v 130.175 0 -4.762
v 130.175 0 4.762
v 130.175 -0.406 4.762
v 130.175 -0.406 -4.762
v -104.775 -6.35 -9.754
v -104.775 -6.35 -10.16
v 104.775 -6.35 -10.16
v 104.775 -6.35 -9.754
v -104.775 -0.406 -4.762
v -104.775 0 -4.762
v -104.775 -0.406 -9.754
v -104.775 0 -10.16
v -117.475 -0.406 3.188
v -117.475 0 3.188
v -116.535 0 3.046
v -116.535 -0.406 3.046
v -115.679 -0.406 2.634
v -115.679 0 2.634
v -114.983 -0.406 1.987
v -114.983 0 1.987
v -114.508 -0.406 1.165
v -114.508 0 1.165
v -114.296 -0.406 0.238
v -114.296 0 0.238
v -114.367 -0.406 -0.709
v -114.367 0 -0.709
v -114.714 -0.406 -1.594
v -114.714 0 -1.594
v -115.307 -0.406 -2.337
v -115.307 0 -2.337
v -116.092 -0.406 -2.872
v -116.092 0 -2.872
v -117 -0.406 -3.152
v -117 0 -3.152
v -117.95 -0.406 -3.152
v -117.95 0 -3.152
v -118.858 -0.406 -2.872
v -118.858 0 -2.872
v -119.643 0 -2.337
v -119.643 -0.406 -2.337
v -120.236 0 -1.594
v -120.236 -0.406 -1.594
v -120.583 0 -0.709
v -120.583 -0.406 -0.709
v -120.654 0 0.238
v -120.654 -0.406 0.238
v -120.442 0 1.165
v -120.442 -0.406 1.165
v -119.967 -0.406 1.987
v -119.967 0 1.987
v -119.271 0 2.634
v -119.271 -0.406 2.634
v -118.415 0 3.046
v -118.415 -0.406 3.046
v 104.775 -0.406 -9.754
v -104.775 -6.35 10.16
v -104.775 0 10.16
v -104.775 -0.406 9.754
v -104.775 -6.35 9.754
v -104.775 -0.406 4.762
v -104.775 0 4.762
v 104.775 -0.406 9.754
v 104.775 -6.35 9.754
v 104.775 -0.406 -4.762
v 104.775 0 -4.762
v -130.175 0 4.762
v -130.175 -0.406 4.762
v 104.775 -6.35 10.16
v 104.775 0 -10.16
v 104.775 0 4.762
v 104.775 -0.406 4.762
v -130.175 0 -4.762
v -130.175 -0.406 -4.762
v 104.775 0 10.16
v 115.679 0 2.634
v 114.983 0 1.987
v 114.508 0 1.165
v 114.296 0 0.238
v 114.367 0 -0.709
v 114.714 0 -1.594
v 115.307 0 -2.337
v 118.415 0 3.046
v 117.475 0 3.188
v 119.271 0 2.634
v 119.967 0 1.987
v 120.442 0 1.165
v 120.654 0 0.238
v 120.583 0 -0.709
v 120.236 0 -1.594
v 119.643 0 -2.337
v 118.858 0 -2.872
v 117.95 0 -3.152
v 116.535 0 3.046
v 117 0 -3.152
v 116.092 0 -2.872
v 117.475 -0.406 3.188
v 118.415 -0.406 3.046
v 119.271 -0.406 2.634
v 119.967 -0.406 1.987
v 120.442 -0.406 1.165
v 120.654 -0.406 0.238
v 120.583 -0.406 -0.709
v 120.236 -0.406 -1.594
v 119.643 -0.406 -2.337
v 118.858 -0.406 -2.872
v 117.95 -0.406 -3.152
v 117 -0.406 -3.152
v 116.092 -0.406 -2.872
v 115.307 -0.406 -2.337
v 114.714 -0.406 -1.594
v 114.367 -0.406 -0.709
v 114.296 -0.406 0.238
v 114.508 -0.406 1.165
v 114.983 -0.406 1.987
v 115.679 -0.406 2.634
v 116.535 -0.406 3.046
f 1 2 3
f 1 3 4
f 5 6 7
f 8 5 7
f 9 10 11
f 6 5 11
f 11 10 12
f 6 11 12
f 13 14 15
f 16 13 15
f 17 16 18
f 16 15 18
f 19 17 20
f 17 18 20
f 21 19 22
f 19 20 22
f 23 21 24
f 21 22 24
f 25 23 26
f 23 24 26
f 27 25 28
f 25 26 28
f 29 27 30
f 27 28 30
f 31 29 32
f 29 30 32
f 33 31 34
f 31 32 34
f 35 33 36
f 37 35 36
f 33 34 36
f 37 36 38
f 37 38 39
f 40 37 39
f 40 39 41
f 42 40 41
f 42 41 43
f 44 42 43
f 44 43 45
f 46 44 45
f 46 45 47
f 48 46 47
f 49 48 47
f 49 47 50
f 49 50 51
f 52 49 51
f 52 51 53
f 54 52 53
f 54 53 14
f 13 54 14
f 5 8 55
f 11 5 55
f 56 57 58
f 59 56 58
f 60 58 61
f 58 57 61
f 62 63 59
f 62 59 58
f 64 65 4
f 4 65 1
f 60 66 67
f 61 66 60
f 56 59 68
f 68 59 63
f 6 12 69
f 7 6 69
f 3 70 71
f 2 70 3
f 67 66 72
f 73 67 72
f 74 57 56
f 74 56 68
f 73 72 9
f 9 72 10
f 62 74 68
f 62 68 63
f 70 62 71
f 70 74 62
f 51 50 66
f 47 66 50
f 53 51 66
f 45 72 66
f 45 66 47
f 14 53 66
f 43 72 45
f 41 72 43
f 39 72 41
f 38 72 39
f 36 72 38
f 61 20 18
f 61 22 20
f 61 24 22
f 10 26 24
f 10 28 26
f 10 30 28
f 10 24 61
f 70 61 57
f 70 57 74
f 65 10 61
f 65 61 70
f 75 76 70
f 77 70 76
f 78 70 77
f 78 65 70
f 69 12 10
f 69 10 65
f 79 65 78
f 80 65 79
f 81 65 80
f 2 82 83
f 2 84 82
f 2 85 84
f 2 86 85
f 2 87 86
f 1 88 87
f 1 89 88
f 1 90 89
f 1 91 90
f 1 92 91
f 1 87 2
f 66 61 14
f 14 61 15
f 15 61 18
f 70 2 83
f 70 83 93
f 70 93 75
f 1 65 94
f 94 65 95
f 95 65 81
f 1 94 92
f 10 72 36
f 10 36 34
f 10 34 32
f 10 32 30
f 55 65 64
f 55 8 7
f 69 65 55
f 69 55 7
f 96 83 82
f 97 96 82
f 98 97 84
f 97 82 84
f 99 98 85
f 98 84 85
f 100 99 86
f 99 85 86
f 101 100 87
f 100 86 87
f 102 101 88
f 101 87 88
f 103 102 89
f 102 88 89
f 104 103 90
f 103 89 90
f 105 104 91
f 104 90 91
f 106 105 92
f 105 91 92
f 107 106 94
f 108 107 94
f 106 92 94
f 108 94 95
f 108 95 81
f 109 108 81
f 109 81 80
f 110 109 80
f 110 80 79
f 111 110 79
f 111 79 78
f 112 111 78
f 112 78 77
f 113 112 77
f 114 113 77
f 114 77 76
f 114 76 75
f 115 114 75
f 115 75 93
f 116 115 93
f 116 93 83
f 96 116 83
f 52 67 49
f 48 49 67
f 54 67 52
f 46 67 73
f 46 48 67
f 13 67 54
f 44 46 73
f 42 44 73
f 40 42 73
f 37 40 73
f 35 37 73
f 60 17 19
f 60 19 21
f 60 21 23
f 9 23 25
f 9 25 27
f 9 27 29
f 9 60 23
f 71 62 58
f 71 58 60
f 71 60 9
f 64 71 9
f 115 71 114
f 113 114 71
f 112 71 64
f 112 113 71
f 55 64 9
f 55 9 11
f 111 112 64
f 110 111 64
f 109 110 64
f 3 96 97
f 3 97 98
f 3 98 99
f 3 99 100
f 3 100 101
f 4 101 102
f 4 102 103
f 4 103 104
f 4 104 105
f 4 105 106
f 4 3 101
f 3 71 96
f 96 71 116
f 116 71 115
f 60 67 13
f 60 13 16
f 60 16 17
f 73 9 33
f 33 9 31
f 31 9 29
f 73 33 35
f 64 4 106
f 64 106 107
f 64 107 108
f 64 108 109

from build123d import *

# Parameters (mm, degrees)
SKETCH2_W           = 260.35
SKETCH2_H           = 20.32
SKETCH2_R           = 3.1877
BOSS_EXTRUDE1_DEPTH = 6.35
SKETCH3_W           = 19.5072
SKETCH3_H           = 5.9436
CUT_EXTRUDE1_DEPTH  = 261.625537122
SKETCH4_W           = 25.4
SKETCH4_H           = 5.3975
CUT_EXTRUDE2_DEPTH  = 131.725203098


with BuildPart() as part:
    # Sketch2 → Boss-Extrude1 (new body)
    with BuildSketch(Plane(origin=(0, 0, 0), x_dir=(1, 0, 0), z_dir=(0, 1, 0))):
        Rectangle(SKETCH2_W, SKETCH2_H)
        with Locations(Location((-117.475, 0, 0), (0, 0, 270))):
            Circle(SKETCH2_R, mode=Mode.SUBTRACT)
        with Locations(Location((117.475, 0, 0), (0, 0, 270))):
            Circle(SKETCH2_R, mode=Mode.SUBTRACT)
    extrude(amount=-BOSS_EXTRUDE1_DEPTH)

    # Sketch3 → Cut-Extrude1 (cut, through all)
    with BuildSketch(Plane(origin=(130.175, 0, 0), x_dir=(0, 0, -1), z_dir=(1, 0, 0))):
        with Locations((0, -3.3782)):
            Rectangle(SKETCH3_W, SKETCH3_H)
    extrude(amount=-CUT_EXTRUDE1_DEPTH, mode=Mode.SUBTRACT)

    # Sketch4 → Cut-Extrude2 (cut, through all)
    with BuildSketch(Plane(origin=(0, 0, 0), x_dir=(1, 0, 0), z_dir=(0, 1, 0))):
        with Locations((-117.475, 7.46125)):
            Rectangle(SKETCH4_W, SKETCH4_H)
        with Locations((-117.475, -7.46125)):
            Rectangle(SKETCH4_W, SKETCH4_H)
        with Locations((117.475, 7.46125)):
            Rectangle(SKETCH4_W, SKETCH4_H)
        with Locations((117.475, -7.46125)):
            Rectangle(SKETCH4_W, SKETCH4_H)
    extrude(amount=-CUT_EXTRUDE2_DEPTH, mode=Mode.SUBTRACT)


solid = part.part
